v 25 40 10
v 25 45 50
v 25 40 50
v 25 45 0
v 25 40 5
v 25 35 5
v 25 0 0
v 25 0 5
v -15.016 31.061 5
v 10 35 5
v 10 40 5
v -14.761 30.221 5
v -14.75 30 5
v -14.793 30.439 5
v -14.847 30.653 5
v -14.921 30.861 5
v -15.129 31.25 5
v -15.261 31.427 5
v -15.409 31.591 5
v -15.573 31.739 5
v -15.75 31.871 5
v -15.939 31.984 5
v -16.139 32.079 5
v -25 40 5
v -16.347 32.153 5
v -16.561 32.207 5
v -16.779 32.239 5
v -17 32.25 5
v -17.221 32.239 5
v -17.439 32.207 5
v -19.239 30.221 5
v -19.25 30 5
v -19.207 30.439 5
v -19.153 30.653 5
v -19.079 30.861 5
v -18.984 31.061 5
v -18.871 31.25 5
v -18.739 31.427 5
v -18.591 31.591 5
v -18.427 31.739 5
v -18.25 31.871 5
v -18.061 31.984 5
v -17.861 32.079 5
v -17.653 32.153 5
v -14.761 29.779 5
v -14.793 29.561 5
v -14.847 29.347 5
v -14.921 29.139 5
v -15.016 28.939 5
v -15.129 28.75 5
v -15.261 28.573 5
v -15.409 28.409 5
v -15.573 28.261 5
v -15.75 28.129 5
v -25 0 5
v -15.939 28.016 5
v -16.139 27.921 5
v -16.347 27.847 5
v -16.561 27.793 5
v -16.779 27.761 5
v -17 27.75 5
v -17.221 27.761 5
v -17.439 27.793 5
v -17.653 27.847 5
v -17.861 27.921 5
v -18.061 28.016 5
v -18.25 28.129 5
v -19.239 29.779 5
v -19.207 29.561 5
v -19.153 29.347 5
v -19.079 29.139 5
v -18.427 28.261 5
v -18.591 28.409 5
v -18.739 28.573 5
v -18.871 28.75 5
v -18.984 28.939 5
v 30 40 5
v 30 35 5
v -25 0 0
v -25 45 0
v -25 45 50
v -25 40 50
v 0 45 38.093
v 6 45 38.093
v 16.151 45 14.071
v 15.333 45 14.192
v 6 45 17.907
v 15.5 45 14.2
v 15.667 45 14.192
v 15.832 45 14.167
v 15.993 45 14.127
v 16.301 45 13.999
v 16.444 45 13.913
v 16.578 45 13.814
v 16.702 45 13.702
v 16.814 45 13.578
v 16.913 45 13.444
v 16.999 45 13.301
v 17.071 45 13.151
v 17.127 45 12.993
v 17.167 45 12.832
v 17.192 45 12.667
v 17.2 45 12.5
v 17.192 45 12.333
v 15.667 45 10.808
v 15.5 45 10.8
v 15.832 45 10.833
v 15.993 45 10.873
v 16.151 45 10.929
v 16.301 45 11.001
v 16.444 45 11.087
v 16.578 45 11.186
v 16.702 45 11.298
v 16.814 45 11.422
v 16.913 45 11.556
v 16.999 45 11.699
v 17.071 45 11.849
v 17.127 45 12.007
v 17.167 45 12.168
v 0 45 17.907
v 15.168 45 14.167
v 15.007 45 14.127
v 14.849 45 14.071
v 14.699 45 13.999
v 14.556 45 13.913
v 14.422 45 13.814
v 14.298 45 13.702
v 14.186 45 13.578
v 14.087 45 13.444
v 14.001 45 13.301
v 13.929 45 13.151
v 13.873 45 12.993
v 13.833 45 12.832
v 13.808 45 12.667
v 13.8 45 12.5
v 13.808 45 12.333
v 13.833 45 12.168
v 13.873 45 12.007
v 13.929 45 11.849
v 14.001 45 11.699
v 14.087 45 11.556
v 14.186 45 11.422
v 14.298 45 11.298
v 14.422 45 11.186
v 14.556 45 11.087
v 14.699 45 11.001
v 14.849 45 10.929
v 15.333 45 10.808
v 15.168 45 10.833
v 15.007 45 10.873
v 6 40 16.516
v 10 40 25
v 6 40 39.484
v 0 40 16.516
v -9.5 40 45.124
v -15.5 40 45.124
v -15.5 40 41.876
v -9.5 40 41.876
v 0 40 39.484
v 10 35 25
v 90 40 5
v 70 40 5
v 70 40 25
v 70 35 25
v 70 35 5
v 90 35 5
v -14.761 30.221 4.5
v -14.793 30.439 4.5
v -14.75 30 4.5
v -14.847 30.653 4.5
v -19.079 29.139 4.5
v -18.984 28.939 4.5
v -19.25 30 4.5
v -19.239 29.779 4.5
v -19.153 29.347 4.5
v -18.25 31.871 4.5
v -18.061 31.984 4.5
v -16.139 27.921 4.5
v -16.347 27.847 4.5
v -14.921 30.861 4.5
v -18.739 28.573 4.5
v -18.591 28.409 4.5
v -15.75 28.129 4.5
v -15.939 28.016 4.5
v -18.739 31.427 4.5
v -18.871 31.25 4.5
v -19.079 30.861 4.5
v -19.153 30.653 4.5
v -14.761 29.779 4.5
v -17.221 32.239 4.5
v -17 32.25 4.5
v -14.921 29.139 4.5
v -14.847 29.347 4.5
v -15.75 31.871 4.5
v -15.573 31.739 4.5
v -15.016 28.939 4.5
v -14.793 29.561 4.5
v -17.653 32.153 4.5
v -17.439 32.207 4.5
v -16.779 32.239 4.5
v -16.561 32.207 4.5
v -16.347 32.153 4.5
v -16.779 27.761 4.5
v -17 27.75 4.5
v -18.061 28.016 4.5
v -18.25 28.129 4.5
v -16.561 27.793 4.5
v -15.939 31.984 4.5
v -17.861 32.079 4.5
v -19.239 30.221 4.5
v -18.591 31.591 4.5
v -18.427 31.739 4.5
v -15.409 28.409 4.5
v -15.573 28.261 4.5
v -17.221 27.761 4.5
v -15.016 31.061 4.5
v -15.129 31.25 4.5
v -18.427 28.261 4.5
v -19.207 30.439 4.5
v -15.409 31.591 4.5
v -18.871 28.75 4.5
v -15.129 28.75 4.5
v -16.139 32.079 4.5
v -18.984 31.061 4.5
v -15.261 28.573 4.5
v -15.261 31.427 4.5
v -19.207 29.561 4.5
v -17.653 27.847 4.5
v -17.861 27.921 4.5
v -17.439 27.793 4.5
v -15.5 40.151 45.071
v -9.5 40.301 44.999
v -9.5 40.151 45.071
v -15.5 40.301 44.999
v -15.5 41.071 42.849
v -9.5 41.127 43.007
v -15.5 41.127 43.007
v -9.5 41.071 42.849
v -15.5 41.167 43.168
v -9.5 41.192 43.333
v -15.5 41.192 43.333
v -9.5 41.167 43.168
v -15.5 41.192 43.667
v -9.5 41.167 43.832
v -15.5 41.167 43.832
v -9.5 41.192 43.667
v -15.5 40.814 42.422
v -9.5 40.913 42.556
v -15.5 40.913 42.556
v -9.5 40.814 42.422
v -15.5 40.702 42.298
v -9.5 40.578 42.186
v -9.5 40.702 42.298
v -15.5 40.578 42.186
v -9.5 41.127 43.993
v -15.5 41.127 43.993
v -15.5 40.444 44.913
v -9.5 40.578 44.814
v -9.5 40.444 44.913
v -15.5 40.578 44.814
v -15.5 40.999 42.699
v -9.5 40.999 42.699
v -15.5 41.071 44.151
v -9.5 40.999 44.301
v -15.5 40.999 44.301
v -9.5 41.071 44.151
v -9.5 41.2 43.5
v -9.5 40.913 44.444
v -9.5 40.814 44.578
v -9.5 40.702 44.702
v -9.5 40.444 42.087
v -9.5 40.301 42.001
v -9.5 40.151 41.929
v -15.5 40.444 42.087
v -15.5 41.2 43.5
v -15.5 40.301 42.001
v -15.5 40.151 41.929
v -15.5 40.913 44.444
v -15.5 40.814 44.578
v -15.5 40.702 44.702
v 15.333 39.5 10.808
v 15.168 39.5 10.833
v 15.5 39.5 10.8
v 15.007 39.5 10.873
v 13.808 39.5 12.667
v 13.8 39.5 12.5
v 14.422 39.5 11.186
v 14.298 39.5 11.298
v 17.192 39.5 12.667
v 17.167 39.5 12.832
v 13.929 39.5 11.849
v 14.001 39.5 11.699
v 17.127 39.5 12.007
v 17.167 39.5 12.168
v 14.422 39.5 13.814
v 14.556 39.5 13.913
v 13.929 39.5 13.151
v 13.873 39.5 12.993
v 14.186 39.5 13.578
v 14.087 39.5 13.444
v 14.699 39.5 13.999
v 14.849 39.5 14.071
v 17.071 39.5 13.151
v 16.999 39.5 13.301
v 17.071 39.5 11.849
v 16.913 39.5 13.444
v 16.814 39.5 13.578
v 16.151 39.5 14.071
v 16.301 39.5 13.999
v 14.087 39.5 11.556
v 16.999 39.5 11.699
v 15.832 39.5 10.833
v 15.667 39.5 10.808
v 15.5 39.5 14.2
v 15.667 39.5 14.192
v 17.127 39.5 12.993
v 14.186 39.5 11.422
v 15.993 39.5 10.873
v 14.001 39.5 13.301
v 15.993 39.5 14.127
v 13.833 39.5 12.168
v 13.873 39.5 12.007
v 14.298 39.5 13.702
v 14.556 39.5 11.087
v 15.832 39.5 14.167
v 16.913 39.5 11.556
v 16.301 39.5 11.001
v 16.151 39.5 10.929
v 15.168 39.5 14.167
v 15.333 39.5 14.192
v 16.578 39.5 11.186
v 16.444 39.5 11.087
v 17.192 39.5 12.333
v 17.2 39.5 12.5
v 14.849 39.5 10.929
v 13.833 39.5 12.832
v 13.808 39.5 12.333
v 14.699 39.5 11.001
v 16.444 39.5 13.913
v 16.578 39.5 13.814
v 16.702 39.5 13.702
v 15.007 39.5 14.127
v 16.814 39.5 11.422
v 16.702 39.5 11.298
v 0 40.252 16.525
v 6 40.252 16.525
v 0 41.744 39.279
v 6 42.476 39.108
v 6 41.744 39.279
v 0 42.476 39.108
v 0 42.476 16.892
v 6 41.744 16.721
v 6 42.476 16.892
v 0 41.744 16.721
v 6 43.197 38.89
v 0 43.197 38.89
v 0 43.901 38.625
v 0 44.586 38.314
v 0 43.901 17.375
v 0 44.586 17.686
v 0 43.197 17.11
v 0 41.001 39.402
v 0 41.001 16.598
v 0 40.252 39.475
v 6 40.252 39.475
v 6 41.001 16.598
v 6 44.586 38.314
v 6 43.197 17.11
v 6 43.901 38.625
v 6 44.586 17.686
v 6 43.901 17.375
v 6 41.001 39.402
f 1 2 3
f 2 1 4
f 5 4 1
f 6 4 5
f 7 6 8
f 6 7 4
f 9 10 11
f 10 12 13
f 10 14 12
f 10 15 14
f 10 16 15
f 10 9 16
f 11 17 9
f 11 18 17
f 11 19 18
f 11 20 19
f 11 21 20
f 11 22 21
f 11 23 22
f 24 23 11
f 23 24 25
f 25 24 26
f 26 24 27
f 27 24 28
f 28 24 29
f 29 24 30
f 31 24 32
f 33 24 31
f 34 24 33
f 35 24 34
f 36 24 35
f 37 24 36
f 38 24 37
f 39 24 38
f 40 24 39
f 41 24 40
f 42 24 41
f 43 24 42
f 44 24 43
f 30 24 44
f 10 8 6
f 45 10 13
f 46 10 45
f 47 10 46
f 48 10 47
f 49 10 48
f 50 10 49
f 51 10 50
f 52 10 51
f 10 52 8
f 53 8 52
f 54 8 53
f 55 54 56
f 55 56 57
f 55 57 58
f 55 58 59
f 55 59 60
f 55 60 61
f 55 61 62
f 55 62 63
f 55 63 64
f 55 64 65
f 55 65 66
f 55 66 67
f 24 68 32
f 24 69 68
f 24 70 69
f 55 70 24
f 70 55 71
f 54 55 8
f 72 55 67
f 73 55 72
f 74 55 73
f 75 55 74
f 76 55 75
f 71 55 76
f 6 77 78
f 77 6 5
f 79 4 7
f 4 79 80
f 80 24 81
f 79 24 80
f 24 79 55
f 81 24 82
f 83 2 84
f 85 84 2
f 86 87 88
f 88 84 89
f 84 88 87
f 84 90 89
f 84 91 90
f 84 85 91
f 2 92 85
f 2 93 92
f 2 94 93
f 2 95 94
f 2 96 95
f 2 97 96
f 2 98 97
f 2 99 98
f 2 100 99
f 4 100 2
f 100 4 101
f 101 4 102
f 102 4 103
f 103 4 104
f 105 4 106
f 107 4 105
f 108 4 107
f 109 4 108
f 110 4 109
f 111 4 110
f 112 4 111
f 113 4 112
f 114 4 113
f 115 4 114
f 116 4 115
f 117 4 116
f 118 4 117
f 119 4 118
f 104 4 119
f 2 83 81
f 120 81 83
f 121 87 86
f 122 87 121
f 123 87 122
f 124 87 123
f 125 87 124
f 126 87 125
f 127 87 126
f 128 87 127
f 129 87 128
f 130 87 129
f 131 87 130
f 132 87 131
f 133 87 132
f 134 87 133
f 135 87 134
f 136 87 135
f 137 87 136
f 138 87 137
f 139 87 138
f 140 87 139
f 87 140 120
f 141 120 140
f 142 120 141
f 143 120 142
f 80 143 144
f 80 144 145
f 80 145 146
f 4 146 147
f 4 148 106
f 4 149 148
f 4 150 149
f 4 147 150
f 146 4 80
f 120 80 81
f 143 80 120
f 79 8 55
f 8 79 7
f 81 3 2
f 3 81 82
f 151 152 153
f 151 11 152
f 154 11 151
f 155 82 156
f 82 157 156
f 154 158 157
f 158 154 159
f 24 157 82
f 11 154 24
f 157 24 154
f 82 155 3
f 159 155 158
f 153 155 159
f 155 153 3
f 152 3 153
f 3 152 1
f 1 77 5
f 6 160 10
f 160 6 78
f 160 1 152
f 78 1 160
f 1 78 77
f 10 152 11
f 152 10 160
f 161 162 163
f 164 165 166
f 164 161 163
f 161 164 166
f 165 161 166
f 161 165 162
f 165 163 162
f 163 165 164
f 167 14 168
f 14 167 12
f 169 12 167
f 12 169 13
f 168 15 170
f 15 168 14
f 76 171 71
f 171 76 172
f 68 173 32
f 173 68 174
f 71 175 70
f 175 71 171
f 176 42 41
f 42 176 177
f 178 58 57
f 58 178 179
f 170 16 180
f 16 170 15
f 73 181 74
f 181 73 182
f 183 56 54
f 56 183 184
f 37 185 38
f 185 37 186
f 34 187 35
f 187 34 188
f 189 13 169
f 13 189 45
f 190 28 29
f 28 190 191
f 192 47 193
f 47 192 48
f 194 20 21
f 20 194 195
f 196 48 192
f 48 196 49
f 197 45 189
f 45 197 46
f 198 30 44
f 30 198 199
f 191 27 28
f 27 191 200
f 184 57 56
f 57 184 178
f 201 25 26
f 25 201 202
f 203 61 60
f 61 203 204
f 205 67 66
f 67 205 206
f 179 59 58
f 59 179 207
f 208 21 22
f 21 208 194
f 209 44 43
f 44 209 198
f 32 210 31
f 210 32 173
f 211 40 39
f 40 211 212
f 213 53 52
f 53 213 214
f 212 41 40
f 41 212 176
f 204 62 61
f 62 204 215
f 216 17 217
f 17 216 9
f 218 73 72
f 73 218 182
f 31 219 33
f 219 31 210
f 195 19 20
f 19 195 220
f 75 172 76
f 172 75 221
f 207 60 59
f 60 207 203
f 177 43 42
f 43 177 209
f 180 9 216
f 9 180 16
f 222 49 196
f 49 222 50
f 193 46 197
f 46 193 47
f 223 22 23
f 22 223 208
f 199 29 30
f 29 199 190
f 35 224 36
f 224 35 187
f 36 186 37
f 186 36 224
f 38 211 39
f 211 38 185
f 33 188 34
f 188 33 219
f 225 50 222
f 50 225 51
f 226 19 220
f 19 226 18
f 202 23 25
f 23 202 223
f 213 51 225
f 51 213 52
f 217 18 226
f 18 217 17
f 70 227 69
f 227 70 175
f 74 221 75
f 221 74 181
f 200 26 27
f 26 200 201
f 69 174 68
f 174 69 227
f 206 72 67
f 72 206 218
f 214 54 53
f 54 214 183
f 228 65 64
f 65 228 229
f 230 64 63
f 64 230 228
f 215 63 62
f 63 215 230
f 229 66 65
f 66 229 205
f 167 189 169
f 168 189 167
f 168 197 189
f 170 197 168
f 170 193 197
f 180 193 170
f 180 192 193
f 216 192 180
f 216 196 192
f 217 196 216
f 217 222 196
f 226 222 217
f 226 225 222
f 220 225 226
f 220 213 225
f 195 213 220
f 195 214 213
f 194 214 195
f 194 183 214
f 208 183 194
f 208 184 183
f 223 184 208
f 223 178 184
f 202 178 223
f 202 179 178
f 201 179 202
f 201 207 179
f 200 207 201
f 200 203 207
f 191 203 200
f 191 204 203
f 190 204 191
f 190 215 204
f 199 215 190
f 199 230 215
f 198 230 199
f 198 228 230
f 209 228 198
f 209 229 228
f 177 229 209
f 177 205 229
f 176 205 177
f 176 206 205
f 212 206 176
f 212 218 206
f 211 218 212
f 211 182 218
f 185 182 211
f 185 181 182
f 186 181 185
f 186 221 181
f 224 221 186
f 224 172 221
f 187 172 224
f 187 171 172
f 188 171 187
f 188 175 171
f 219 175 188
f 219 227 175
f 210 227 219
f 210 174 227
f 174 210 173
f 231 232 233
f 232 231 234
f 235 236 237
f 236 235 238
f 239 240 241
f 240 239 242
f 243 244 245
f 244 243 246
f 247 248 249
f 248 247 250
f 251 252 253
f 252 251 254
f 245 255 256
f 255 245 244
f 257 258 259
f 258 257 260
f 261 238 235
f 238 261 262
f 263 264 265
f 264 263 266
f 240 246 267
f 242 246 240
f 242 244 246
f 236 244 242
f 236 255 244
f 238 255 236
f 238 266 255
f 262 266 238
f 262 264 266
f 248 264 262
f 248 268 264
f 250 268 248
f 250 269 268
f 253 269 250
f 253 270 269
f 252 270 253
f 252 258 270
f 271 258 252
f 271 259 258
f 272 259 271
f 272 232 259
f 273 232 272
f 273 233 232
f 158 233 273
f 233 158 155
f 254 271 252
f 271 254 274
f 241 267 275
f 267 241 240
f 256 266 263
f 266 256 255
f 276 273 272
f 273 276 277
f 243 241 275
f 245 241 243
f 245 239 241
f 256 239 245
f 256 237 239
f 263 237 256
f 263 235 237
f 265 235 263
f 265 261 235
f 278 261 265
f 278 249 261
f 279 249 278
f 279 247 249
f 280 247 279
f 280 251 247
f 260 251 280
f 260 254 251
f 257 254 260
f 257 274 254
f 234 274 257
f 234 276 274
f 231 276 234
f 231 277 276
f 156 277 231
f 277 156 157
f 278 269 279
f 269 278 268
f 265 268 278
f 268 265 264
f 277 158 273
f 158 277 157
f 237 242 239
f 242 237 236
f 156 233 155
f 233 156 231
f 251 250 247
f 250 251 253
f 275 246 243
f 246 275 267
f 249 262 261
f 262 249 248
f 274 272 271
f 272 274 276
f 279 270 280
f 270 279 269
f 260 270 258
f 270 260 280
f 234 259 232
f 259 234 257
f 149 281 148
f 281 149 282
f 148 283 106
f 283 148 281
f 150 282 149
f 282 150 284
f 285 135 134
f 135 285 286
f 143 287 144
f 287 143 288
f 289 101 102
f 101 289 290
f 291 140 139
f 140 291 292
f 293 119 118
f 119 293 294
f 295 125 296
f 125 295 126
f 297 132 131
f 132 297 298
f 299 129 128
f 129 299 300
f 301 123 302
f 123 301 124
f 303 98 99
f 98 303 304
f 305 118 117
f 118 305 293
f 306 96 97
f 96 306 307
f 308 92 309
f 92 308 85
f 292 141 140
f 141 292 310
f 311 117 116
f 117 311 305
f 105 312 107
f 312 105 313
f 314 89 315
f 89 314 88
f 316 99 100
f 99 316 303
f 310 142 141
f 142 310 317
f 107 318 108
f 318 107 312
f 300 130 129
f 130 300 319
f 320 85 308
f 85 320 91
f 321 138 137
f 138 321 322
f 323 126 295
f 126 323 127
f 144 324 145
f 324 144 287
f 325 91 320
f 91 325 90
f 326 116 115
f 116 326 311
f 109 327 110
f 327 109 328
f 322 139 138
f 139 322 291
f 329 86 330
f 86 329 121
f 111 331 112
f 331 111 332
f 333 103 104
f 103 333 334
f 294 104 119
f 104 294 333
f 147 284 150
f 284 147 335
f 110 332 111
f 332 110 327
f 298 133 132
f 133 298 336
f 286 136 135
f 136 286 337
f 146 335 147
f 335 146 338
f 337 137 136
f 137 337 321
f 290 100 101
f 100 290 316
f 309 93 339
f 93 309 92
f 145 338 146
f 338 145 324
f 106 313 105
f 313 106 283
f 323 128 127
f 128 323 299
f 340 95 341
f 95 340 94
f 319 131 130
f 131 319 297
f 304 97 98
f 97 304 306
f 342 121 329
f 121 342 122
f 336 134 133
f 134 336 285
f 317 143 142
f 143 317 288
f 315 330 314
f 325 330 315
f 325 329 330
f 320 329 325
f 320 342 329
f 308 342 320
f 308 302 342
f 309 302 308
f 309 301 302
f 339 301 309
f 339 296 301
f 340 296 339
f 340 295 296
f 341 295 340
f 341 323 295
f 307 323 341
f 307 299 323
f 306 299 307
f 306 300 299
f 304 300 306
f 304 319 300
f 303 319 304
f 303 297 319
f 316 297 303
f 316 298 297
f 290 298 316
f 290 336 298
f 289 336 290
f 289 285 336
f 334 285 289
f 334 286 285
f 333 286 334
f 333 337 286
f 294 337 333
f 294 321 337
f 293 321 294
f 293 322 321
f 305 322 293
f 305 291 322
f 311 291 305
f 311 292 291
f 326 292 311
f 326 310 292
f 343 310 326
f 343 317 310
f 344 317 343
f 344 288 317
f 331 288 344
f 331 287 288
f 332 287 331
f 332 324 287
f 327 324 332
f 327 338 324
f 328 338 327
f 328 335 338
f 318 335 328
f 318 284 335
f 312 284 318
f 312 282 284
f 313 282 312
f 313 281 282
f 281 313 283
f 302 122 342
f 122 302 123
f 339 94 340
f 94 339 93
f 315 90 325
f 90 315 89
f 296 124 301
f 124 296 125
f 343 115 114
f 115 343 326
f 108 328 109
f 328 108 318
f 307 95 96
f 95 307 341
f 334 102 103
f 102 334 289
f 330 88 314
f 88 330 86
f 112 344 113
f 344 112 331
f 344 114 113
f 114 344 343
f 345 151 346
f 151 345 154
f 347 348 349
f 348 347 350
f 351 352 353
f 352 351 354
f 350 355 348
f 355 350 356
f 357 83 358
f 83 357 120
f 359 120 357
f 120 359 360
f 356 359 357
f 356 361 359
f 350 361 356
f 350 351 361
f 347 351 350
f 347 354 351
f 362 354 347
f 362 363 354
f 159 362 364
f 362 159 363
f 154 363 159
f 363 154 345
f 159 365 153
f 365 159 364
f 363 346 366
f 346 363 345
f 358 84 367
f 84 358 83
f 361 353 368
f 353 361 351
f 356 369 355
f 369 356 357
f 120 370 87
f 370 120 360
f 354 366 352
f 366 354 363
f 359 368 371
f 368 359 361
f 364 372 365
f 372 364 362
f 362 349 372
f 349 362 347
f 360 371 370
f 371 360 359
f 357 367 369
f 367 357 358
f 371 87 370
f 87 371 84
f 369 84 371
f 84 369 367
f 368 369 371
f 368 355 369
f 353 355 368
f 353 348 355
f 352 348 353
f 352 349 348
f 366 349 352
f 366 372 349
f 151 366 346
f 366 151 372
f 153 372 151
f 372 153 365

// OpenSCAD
// L-shaped mounting bracket for NEMA 17 stepper motor (syringe pump)
// Print orientation: base plate on bed, motor plate builds upward (+Z)

// ---------------- Parameters ----------------
plate_x       = 25;    // base plate half-width (X)
plate_y       = 45;    // base plate length (Y)
plate_t       = 5;     // base plate thickness (Z)

motor_h       = 50;    // motor plate height (Z)
motor_w       = 5;     // motor plate thickness (Y)

boss_d        = 23;    // motor boss hole diameter
boss_x        = 0;     // boss hole centre X
boss_z        = 28;    // boss hole centre Z

screw_d       = 3.4;   // M3 screw hole diameter
screw_p       = 31;    // square pattern side length
screw_count   = 4;     // number of screw holes

gusset_t      = 5;     // gusset thickness (X)
gusset_y      = 20;    // gusset leg along +Y
gusset_z      = 20;    // gusset leg along +Z

eps           = 0.5;   // cutter overshoot past faces
$fn           = 96;    // curve resolution

// ---------------- Model ----------------
difference() {
    union() {
        // Base plate
        translate([-plate_x, 0, 0])
            cube([plate_x * 2, plate_y, plate_t]);

        // Motor plate (stands on back edge of base)
        translate([-plate_x, plate_y - motor_w, 0])
            cube([plate_x * 2, motor_w, motor_h]);

        // Left gusset: right triangle in YZ, flush with left edge
        // rotate([90,0,0]) maps polygon X -> world Y, polygon Y -> world Z
        translate([-plate_x - gusset_t, plate_y - motor_w, 0])
            rotate([90, 0, 0])
                linear_extrude(height = gusset_t)
                    polygon(points = [
                        [plate_y - motor_w, plate_t],   // right-angle corner
                        [plate_y - motor_w + gusset_y, plate_t],
                        [plate_y - motor_w, plate_t + gusset_z]
                    ]);

        // Right gusset: right triangle in YZ, flush with right edge
        translate([plate_x + gusset_t, plate_y - motor_w, 0])
            rotate([90, 0, 0])
                linear_extrude(height = gusset_t)
                    polygon(points = [
                        [plate_y - motor_w, plate_t],
                        [plate_y - motor_w + gusset_y, plate_t],
                        [plate_y - motor_w, plate_t + gusset_z]
                    ]);
    }

    // Base plate through-holes (M4)
    for (h = [plate_t - eps, plate_t + eps])
        translate([-17, 30, h])
            cylinder(d = 4.5, h = 2 * eps, $fn = 64);

    // Motor boss hole (along Y)
    translate([boss_x, plate_y - motor_w - eps, boss_z])
        rotate([0, 90, 0])
            cylinder(d = boss_d, h = motor_w + 2 * eps, $fn = 96);

    // M3 screw holes on square pattern centred on boss hole
    for (i = [0 : screw_count - 1]) {
        a = (i < 2) ? 0 : 90;   // two orthogonal rows
        translate([boss_x + (i < 2 ? -1 : 1) * screw_p / 2,
                   plate_y - motor_w - eps,
                   boss_z + (i >= 2 ? -1 : 1) * screw_p / 2])
            rotate([0, 90, a])
                cylinder(d = screw_d, h = motor_w + 2 * eps, $fn = 64);
    }
}
